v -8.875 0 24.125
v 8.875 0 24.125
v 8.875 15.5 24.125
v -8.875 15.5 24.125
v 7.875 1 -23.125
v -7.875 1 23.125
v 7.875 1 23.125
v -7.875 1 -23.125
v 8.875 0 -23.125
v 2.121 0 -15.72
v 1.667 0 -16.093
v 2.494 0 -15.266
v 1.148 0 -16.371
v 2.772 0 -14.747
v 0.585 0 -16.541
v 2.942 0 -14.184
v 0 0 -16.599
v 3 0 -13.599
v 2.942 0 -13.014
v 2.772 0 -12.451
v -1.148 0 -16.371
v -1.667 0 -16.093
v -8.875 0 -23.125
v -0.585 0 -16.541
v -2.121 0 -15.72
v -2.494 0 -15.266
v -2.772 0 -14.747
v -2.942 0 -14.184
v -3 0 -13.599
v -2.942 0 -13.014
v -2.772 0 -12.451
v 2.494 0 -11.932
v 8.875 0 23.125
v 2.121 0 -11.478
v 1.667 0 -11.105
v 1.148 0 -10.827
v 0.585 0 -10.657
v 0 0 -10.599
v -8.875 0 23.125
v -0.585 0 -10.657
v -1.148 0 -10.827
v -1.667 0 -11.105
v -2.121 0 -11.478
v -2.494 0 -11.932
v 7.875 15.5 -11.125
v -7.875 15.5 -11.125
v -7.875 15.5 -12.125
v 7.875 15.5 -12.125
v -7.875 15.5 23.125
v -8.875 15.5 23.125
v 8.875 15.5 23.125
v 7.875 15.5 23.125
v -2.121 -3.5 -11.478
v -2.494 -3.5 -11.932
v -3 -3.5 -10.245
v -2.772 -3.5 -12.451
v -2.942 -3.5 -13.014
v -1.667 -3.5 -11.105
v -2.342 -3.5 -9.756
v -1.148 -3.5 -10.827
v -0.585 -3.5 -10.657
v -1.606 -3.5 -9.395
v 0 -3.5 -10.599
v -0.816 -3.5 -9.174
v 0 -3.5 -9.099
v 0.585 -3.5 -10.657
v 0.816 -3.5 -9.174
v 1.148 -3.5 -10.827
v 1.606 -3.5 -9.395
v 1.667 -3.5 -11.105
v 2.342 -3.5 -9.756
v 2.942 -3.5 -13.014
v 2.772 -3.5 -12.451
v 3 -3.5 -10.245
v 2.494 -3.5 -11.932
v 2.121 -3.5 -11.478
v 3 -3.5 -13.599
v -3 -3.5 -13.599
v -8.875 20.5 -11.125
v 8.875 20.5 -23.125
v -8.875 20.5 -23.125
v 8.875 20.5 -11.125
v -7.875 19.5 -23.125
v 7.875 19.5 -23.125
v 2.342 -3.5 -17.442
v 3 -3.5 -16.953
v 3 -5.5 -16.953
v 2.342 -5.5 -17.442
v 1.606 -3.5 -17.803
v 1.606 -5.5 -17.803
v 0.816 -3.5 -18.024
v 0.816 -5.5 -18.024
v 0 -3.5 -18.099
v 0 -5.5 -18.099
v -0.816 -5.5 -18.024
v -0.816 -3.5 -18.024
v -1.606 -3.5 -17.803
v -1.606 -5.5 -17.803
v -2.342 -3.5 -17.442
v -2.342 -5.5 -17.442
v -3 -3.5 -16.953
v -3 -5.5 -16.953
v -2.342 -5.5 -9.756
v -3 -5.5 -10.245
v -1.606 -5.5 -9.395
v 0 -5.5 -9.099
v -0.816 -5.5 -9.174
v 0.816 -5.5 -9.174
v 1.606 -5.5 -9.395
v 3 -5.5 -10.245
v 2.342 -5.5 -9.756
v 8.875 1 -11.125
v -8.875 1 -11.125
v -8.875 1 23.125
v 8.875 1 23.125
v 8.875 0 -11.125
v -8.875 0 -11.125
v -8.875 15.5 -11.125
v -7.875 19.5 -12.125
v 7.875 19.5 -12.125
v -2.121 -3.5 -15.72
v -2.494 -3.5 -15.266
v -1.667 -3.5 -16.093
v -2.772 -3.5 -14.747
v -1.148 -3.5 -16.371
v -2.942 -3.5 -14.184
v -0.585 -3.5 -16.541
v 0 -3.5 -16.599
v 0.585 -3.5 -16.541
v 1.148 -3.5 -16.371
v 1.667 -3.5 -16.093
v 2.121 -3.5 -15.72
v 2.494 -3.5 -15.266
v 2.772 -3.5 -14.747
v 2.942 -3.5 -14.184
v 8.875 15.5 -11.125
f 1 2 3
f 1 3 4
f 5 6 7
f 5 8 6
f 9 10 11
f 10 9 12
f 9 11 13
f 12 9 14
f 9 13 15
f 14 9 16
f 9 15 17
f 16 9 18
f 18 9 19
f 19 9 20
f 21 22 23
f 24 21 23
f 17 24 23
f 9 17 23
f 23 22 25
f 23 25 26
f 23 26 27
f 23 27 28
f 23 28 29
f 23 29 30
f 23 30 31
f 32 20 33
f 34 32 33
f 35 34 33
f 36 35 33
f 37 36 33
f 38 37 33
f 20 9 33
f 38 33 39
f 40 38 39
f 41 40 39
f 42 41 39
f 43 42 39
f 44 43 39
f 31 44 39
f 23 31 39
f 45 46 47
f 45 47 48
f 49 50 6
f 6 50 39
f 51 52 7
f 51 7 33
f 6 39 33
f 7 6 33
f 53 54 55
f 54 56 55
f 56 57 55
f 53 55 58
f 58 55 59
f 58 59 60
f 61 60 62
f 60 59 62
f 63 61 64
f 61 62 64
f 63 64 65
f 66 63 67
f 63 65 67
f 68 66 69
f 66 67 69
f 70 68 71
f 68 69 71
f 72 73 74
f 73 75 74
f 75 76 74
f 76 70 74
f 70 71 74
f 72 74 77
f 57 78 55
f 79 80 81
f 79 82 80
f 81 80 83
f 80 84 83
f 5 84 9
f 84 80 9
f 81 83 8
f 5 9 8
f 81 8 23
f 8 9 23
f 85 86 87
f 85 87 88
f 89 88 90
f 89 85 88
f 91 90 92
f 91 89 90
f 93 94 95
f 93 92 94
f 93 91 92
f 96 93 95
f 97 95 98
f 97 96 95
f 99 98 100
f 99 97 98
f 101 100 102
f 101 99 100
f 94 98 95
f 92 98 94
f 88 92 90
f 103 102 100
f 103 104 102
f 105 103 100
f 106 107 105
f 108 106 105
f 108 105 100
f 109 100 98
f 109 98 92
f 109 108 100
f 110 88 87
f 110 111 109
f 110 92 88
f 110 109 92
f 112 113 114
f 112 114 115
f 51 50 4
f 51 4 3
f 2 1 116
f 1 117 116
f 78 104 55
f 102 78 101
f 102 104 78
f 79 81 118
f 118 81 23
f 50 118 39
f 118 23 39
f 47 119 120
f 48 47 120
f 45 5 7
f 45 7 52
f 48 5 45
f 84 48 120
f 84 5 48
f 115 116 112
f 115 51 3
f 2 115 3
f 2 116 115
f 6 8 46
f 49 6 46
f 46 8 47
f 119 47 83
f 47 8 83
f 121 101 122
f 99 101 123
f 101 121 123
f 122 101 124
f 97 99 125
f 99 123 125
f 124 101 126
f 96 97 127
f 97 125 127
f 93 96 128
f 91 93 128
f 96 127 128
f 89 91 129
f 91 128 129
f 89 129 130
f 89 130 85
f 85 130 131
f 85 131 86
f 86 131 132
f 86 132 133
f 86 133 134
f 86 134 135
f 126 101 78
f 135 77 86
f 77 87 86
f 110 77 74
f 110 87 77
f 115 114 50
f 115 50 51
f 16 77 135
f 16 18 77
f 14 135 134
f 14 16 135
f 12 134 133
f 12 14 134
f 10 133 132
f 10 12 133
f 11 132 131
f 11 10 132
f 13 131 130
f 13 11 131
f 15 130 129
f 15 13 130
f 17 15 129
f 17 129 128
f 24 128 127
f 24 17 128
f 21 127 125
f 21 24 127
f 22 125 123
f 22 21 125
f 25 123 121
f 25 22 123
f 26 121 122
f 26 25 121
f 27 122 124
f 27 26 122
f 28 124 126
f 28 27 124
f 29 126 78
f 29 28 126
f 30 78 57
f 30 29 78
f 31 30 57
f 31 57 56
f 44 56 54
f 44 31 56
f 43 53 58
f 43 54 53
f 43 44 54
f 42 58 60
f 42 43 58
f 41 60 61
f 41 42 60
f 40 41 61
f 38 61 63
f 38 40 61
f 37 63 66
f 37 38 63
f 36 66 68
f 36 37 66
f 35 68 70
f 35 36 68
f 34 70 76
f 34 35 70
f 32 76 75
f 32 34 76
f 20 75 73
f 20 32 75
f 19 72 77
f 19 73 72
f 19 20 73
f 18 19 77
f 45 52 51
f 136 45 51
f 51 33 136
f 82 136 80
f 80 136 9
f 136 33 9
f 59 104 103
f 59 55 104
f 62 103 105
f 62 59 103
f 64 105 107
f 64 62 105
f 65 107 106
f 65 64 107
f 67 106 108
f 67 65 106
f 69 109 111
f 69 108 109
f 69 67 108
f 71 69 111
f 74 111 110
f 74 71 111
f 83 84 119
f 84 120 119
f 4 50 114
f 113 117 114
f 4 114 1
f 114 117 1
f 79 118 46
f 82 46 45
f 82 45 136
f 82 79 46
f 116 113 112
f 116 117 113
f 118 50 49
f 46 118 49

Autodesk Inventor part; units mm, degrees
ref_plane "YZ Plane" through (0, 0, 0) normal (1, 0, 0) x (0, 1, 0)
ref_plane "XZ Plane" through (0, 0, 0) normal (0, 1, 0) x (-1, 0, 0)
ref_plane "XY Plane" through (0, 0, 0) normal (0, 0, 1) x (1, 0, 0)
sketch "Sketch1" plane through (0, 0, 0) normal (0, 1, 0) x (-1, 0, 0)
  line L0 (-8.875, -23.125) -> (8.875, -23.125)
  line L1 (8.875, -23.125) -> (8.875, 23.125)
  line L2 (8.875, 23.125) -> (-8.875, 23.125)
  line L3 (-8.875, 23.125) -> (-8.875, -23.125)
  line L4 (-8.875, -23.125) -> (8.875, 23.125) construction
  line L5 (8.875, -23.125) -> (-8.875, 23.125) construction
  point P0 (0, 0)
  dimension "d0" = 17.75
  dimension "d1" = 46.25
extrude "Extrusion1" add sketch "Sketch1" along normal blind 20.5
sketch "Sketch2" plane through (0, 20.5, 0) normal (0, 1, 0) x (1, 0, 0)
  line L0 (-8.875, 23.125) -> (-8.875, -23.125) projected
  line L1 (-8.875, -23.125) -> (8.875, -23.125) projected
  line L2 (8.875, -23.125) -> (8.875, 23.125) projected
  line L3 (8.875, 23.125) -> (-8.875, 23.125) projected
  line L4 (-8.875, 11.125) -> (8.875, 11.125)
  point P0 (0, 0)
  dimension "d4" = 12
extrude "Extrusion2" cut sketch "Sketch2" against normal blind 5 contours L4 L2 L1 L0
shell "Shell1" thickness 1 removed faces 1 at (-2.9583, 15.5, 0.2917)
shell "Shell2" thickness 1 removed faces 2 at (2.9583, 13.6667, -23.125) at (2.625, 13.3333, -22.125)
sketch "Sketch3" plane through (-8.875, 0, 23.125) normal (0, 0, 1) x (1, 0, 0)
  line L0 (17.75, 0) -> (17.75, 15.5) projected
  line L1 (0, 7) -> (18, 7)
  line L2 (1, 15.5) -> (16.75, 15.5) projected
  line L3 (8.875, 15.5) -> (8.875, 0)
  point P0 (8.875, 7)
hole "Hole1" at (0, 7, 23.125) direction (0, 0, -1) diameter 7 depth 8 tip angle 118
sketch "Sketch4" plane through (0, 0, 0) normal (0, -1, 0) x (1, 0, 0)
  circle A0 centre (0, -13.599) radius 3
  point P0 (0, 0)
  dimension "d16" = 6
extrude "Extrusion3" add sketch "Sketch4" along normal blind 3.5
sketch "Sketch5" plane through (0, -3.5, -13.599) normal (0, -1, 0) x (1, 0, 0)
  circle A0 centre (0, 0) radius 3 projected
  circle A1 centre (0, 0) radius 4.5
  point P0 (0, 13.599)
  dimension "d19" = 9
extrude "Extrusion4" add sketch "Sketch5" along normal blind 2 contours A0 | A1
sketch "Sketch6" plane through (0, -5.5, -13.599) normal (0, -1, 0) x (1, 0, 0)
  circle A0 centre (0, 0) radius 4.5 projected
  line L0 (-3, -4.5) -> (3, -4.5)
  line L1 (3, -4.5) -> (3, 4.5)
  line L2 (3, 4.5) -> (-3, 4.5)
  line L3 (-3, 4.5) -> (-3, -4.5)
  line L4 (-3, -4.5) -> (3, 4.5) construction
  line L5 (3, -4.5) -> (-3, 4.5) construction
  point P0 (0, 13.599)
  point P1 (3, 3.3541)
  point P2 (3, -3.3541)
  point P3 (-3, -3.3541)
  point P4 (-3, 3.3541)
  dimension "d22" = 6
extrude "Extrusion5" cut sketch "Sketch6" against normal blind 2 contours A0 L1 | L3 A0
sketch "Sketch7" plane through (7.875, 15.5, 22.125) normal (0, 0, -1) x (-1, 0, 0)
  circle A0 centre (7.875, -8.5) radius 3.5 projected
  line L0 (0, 0) -> (15.75, 0) projected
  line L1 (0, -14.5) -> (0, 0) projected
  line L2 (15.75, -14.5) -> (0, -14.5) projected
  line L3 (15.75, -14.5) -> (15.75, 0) projected
  point P0 (7.875, -15.5)
extrude "Extrusion6" cut sketch "Sketch7" against normal blind 2
sketch "Sketch8" plane through (-7.875, 1, 23.125) normal (0, 1, 0) x (1, 0, 0)
  line L0 (15.75, 0) -> (0, 0) projected
  line L1 (0, 34.25) -> (0, 35.25) projected
  line L2 (-1, 46.25) -> (-1, 0) projected
  line L3 (16.75, -1) -> (-1, -1)
  line L4 (-1, -1) -> (-1, 34.25)
  line L5 (-1, 34.25) -> (16.75, 34.25)
  line L6 (16.75, 34.25) -> (16.75, -1)
  point P0 (7.875, 23.125)
  dimension "d27" = 1
extrude "Extrusion7" add sketch "Sketch8" along normal blind 1 separate body
sketch "Sketch9" plane through (-7.875, 2, 23.125) normal (0, 1, 0) x (1, 0, 0)
  line L0 (16.75, -1) -> (16.75, 34.25) projected
  line L1 (-1, 34.25) -> (-1, -1) projected
  line L2 (-1, -1) -> (16.75, -1) projected
  line L3 (16.75, -1) -> (-1, -1)
  line L4 (-1, -1) -> (-1, 0)
  line L5 (-1, 0) -> (16.75, 0)
  line L6 (16.75, 0) -> (16.75, -1)
  point P0 (7.875, 23.125)
  point P1 (-1, 0)
extrude "Extrusion8" add sketch "Sketch9" along normal blind 15 bodies 2
move or copy body "Move Body1" bodies to move or copy 2 copy no translate (0, -1, 0)
sketch "Sketch10" plane through (-8.875, 16, 24.125) normal (0, 1, 0) x (1, 0, 0)
  line L0 (0, 0) -> (17.75, 0) projected
  line L1 (17.75, 0) -> (17.75, 1) projected
  line L2 (17.75, 1) -> (0, 1) projected
  line L3 (0, 1) -> (0, 0) projected
  point P0 (8.875, 24.125)
extrude "Extrusion9" cut sketch "Sketch10" against normal blind 0.5 bodies 2
properties part number "charger2"
